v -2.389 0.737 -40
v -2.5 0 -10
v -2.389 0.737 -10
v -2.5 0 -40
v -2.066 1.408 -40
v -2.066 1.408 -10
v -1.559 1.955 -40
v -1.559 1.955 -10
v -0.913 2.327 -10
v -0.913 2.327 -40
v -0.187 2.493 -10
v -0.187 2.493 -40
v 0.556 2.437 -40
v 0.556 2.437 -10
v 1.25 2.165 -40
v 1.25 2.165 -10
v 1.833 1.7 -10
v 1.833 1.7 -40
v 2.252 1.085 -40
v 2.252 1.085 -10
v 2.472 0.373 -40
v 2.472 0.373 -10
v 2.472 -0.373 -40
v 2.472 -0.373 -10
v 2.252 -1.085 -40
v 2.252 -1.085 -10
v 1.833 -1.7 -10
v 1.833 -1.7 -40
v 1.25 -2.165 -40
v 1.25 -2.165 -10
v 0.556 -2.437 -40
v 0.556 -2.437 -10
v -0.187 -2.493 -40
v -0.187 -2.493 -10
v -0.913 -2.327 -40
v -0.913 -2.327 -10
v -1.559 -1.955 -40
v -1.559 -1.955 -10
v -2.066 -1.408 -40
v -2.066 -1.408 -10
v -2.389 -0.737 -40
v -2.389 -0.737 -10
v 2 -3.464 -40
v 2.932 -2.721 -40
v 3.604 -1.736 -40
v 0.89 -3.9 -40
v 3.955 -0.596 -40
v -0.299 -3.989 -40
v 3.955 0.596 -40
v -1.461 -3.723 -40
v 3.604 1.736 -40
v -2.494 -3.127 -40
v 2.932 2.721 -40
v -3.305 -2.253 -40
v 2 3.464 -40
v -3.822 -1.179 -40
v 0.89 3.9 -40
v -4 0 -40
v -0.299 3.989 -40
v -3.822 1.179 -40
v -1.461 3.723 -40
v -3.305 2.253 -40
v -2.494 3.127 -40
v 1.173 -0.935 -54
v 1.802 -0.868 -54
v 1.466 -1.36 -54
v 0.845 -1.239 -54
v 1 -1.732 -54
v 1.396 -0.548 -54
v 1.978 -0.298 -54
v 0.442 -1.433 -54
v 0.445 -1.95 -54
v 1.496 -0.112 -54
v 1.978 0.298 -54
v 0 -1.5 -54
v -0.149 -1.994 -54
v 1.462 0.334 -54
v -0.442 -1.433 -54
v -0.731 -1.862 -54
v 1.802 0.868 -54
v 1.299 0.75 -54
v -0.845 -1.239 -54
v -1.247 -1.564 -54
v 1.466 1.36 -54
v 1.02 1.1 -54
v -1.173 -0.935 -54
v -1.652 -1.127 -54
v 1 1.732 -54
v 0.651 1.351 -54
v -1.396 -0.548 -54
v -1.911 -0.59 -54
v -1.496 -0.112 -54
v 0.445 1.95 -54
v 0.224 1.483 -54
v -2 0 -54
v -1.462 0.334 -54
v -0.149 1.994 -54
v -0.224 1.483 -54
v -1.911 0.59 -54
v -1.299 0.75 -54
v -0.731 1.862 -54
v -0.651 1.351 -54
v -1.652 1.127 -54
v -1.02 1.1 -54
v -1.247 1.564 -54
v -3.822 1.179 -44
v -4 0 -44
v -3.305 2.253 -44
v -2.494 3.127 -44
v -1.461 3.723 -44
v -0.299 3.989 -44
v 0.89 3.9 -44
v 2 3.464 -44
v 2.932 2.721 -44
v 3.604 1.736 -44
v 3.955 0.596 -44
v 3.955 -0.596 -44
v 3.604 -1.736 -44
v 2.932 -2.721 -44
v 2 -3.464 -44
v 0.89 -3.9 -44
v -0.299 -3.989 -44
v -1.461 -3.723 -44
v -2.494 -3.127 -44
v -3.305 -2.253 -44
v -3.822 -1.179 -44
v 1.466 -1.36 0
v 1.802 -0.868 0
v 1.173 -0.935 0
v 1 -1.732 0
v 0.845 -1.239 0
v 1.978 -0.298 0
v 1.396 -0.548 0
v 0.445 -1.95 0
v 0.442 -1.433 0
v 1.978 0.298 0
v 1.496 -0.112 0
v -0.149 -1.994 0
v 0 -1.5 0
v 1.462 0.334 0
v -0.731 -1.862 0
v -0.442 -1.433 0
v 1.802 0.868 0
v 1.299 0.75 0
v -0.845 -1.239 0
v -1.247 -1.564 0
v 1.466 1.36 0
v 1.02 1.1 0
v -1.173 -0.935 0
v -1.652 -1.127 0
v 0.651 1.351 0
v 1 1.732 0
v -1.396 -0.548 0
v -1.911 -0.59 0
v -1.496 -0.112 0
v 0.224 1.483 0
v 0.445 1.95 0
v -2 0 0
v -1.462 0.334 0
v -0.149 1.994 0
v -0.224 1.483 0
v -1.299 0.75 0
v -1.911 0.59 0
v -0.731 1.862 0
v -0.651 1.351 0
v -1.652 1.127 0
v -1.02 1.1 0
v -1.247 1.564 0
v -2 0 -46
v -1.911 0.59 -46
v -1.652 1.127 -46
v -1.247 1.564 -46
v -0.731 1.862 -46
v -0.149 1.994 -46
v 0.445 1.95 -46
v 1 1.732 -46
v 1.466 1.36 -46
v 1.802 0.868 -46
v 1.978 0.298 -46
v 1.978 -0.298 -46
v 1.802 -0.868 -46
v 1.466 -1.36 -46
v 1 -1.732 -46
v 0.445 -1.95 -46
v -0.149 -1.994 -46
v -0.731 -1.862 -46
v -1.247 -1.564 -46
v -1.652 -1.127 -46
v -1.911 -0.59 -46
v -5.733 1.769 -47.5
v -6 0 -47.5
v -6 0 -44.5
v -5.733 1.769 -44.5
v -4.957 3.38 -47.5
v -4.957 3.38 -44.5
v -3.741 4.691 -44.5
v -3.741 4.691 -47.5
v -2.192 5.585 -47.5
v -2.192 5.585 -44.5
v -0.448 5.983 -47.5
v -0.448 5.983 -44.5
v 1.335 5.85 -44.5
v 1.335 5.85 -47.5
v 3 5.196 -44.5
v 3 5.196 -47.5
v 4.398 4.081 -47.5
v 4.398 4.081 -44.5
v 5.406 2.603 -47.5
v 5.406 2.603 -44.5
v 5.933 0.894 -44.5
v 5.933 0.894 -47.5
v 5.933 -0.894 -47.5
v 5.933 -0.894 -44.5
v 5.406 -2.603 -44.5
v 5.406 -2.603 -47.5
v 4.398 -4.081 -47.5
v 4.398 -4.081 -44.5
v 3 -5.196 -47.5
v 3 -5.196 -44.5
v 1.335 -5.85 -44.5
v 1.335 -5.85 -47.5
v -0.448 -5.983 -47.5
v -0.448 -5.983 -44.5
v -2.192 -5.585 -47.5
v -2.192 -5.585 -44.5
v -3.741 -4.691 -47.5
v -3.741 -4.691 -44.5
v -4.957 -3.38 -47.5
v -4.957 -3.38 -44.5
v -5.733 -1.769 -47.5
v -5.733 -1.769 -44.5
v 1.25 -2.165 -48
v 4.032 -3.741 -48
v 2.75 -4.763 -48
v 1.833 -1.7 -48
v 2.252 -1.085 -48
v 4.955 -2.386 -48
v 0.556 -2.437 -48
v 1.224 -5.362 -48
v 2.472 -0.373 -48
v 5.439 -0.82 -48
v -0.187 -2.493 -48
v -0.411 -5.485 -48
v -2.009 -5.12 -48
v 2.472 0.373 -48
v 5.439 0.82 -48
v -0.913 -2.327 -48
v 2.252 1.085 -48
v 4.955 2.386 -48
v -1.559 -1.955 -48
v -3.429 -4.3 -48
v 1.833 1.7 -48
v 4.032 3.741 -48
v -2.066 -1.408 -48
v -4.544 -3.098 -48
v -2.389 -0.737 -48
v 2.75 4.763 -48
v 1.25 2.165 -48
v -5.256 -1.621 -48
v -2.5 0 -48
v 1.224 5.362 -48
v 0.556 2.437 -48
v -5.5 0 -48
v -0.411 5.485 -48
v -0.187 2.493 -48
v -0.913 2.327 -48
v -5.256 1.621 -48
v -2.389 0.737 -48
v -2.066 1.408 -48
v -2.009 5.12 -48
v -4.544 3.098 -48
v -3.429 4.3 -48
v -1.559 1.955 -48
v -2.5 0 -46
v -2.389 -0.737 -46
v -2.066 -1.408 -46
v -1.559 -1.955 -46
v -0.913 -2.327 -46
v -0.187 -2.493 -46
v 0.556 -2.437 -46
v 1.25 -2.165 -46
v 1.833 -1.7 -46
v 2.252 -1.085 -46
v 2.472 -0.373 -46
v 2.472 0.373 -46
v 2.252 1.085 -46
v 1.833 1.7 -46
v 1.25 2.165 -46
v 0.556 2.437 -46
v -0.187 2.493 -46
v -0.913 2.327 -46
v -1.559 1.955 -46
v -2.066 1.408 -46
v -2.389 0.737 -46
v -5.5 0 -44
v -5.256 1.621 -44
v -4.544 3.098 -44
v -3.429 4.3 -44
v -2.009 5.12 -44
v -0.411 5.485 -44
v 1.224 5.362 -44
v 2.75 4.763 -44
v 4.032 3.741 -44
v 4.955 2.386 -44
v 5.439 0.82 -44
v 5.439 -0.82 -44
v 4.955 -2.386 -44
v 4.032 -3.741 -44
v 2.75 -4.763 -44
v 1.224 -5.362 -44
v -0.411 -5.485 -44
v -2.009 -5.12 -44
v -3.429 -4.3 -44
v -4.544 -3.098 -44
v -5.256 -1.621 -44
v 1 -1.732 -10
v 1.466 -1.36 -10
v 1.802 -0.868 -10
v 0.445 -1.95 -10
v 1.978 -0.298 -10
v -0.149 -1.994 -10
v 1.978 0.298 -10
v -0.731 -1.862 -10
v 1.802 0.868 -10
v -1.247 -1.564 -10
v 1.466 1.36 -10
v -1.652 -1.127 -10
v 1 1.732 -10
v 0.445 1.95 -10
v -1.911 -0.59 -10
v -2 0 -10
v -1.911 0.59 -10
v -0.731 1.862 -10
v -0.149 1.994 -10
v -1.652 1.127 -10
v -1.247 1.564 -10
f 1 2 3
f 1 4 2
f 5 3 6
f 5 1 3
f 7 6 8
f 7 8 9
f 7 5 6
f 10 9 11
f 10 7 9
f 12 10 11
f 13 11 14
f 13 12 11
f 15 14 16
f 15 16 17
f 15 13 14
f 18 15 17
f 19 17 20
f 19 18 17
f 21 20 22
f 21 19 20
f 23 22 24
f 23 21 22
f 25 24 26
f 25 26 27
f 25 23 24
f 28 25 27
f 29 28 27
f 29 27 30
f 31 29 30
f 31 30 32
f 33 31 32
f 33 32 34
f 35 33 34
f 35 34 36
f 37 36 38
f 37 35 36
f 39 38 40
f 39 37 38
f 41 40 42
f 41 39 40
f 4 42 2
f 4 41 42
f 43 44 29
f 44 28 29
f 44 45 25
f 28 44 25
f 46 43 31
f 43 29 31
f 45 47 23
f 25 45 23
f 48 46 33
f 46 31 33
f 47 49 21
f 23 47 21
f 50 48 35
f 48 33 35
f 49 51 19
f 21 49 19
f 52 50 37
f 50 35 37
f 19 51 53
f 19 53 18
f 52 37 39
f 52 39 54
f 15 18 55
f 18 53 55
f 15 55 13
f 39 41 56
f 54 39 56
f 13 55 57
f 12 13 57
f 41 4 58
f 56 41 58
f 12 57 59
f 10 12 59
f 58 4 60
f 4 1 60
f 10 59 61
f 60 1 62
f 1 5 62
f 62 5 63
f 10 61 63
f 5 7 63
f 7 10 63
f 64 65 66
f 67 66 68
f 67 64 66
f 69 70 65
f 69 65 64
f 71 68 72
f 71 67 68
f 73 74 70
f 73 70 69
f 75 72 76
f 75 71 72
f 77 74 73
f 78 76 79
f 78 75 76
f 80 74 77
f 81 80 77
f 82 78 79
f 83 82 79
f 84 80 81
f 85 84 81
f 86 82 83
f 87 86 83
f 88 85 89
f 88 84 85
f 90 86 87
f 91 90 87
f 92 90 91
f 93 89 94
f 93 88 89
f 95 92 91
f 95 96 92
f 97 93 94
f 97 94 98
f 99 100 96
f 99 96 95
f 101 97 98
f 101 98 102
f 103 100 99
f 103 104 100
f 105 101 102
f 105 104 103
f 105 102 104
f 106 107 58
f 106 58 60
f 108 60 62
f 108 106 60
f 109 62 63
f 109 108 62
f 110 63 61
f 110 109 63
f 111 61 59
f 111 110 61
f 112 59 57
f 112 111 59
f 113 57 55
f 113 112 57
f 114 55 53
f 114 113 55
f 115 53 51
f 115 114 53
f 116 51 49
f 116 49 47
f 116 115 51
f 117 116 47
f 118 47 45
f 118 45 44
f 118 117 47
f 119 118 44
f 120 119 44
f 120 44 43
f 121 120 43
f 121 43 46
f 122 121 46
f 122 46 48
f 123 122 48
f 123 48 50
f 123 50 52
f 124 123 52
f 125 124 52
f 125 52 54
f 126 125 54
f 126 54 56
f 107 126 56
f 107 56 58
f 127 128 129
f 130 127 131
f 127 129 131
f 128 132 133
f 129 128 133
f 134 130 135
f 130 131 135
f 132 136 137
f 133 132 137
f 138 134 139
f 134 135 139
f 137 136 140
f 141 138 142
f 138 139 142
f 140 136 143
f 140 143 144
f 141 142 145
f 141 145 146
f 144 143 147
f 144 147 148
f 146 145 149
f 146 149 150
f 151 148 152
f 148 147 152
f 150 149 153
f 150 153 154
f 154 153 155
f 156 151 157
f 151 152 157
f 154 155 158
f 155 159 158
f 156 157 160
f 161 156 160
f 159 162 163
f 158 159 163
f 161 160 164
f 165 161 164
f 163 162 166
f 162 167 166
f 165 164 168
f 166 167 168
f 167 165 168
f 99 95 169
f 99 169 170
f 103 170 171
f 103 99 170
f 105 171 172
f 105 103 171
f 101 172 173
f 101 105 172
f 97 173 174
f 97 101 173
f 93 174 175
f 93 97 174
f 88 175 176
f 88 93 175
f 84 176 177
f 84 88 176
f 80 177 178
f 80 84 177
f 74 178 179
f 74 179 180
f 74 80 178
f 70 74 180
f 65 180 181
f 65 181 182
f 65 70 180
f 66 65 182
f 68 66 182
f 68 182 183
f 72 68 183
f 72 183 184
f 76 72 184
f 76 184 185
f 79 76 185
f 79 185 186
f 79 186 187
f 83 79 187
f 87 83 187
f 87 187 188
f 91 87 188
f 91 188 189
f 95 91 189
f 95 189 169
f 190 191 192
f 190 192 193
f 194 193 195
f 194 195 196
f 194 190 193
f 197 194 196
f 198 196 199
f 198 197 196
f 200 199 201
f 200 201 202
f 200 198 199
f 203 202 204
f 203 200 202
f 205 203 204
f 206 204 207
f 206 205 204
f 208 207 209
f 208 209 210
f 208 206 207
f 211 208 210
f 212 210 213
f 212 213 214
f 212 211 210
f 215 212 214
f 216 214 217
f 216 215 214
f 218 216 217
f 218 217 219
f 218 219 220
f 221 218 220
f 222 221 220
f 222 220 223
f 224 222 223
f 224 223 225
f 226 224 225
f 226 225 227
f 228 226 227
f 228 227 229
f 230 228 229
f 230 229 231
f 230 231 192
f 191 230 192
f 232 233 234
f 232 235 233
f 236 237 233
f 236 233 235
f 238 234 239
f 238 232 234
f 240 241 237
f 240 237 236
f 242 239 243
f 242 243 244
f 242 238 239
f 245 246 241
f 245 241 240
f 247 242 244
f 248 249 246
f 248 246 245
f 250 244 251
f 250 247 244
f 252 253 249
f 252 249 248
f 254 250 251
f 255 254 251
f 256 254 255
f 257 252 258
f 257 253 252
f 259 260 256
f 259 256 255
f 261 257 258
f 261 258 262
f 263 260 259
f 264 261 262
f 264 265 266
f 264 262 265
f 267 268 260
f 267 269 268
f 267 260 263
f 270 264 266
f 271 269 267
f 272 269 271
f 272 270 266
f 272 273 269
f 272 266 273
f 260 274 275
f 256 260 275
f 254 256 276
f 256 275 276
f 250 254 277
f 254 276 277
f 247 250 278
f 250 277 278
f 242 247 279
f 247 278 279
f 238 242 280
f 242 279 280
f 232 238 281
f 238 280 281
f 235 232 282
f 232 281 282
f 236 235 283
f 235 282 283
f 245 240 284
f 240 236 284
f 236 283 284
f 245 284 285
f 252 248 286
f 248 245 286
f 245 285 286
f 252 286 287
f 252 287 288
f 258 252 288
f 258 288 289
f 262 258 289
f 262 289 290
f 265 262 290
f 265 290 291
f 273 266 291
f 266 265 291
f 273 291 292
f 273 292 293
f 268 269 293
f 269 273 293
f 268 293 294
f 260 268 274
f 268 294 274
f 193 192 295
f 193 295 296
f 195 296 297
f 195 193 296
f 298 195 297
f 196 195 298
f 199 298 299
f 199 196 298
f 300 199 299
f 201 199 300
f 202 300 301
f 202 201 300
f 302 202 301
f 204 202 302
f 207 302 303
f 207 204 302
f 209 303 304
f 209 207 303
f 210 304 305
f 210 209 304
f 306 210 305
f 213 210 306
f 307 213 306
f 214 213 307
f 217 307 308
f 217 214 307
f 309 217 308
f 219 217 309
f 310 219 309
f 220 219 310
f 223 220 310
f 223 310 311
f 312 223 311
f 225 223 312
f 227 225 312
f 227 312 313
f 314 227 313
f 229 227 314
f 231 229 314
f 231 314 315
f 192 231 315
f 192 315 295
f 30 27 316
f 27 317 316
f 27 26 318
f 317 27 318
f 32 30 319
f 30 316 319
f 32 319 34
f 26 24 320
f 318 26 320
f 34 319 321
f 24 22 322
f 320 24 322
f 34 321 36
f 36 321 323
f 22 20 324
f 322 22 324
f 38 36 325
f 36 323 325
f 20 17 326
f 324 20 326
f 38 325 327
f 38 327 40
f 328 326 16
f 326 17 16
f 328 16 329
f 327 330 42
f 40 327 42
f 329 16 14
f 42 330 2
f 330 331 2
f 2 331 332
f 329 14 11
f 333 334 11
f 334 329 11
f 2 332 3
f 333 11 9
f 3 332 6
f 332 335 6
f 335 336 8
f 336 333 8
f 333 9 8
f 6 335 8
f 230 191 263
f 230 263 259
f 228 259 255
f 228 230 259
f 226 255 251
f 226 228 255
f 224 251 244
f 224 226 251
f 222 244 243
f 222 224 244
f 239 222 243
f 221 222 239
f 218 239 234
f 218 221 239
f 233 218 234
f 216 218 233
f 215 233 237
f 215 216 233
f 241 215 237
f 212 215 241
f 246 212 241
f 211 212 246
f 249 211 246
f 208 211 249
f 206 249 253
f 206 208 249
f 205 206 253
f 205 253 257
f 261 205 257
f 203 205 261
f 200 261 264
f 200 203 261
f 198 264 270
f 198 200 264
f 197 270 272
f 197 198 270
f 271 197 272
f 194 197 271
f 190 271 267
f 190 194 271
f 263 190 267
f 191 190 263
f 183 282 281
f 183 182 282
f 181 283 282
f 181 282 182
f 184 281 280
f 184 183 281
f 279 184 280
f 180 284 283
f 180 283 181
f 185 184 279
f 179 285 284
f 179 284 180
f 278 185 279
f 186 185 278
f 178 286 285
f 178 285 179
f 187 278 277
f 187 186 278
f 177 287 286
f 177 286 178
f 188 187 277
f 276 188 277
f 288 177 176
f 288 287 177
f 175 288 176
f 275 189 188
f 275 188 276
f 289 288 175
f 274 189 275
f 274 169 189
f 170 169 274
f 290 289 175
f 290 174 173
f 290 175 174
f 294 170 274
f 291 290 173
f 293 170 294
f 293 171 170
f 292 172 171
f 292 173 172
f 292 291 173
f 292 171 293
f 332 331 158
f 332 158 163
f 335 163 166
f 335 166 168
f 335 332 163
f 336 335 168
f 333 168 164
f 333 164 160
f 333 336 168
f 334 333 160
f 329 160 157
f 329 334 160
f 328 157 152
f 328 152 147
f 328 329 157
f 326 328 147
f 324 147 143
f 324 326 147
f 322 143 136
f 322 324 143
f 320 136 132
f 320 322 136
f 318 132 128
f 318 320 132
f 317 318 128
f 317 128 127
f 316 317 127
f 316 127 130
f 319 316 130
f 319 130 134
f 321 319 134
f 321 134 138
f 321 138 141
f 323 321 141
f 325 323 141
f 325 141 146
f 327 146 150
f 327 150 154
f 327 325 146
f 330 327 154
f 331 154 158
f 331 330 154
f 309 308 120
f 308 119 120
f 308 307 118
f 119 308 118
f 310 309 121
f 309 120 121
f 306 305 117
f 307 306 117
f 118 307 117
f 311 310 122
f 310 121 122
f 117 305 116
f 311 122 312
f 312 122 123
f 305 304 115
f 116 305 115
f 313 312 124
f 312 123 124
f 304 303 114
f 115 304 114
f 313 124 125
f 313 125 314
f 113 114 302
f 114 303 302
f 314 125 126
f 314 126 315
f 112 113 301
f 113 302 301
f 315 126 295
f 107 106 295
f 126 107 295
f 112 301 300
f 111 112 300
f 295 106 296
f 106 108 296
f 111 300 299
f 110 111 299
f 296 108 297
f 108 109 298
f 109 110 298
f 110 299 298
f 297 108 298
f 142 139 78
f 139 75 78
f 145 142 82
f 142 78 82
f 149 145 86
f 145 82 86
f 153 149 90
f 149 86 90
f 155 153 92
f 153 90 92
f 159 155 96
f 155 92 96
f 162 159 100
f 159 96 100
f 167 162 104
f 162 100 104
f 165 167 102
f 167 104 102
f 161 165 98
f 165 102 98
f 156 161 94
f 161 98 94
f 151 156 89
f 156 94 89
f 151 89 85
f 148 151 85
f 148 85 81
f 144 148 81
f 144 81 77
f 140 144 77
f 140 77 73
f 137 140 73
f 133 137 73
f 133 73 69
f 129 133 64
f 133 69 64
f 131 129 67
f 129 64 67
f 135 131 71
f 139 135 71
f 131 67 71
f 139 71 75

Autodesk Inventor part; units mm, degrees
ref_plane "YZ Plane" through (0, 0, 0) normal (1, 0, 0) x (0, 1, 0)
ref_plane "XZ Plane" through (0, 0, 0) normal (0, 1, 0) x (-1, 0, 0)
ref_plane "XY Plane" through (0, 0, 0) normal (0, 0, 1) x (1, 0, 0)
sketch "Skizze1" plane through (0, 0, 0) normal (0, 1, 0) x (-1, 0, 0)
  line L0 (0, 0) -> (0, -54)
  line L1 (0, 0) -> (2, 0)
  line L2 (2, 0) -> (2, -10)
  line L3 (2, -10) -> (2.5, -10)
  line L4 (2.5, -10) -> (2.5, -40)
  line L5 (2.5, -40) -> (4, -40)
  line L6 (4, -40) -> (4, -44)
  line L7 (4, -44) -> (6, -44)
  line L8 (6, -44) -> (6, -48)
  line L9 (6, -48) -> (2.5, -48)
  line L10 (2.5, -48) -> (2.5, -46)
  line L11 (2.5, -46) -> (2, -46)
  line L12 (2, -46) -> (2, -54)
  line L13 (2, -54) -> (0, -54)
  point P0 (0, -27)
  point P1 (4.25, -48)
  point P2 (3.25, -40)
  point P3 (1, -54)
  point P4 (1, 0)
  dimension "d0" = 54
  dimension "d1" = 36
  dimension "d2" = 4
  dimension "d3" = 4
  dimension "d4" = 4
  dimension "d5" = 12
  dimension "d6" = 5
  dimension "d7" = 8
  dimension "d8" = 8
  dimension "d11" = 10
  dimension "d12" = 6
revolve "Umdrehung1" add sketch "Skizze1" angle 360 about axis through (0, 0, 0) along (0, 0, -1)
thread "Gewinde1" size "M8x1.25" class "6g" standard "ISO Metric profile" length 18
chamfer "Fasen1" distance 0.5 angle 45 1 edges at (6, 0, -48)
chamfer "Fasen2" distance 0.5 angle 45 1 edges at (6, 0, -44)
sketch "Skizze2" plane through (0, 0, 0) normal (0, 0, 1) x (1, 0, 0)
  circle A0 centre (0, 0) radius 2 projected
hole "Bohrung1" at (0, 0, 0) direction (0, 0, -1) diameter 3 end through all
properties part number "BRS"
